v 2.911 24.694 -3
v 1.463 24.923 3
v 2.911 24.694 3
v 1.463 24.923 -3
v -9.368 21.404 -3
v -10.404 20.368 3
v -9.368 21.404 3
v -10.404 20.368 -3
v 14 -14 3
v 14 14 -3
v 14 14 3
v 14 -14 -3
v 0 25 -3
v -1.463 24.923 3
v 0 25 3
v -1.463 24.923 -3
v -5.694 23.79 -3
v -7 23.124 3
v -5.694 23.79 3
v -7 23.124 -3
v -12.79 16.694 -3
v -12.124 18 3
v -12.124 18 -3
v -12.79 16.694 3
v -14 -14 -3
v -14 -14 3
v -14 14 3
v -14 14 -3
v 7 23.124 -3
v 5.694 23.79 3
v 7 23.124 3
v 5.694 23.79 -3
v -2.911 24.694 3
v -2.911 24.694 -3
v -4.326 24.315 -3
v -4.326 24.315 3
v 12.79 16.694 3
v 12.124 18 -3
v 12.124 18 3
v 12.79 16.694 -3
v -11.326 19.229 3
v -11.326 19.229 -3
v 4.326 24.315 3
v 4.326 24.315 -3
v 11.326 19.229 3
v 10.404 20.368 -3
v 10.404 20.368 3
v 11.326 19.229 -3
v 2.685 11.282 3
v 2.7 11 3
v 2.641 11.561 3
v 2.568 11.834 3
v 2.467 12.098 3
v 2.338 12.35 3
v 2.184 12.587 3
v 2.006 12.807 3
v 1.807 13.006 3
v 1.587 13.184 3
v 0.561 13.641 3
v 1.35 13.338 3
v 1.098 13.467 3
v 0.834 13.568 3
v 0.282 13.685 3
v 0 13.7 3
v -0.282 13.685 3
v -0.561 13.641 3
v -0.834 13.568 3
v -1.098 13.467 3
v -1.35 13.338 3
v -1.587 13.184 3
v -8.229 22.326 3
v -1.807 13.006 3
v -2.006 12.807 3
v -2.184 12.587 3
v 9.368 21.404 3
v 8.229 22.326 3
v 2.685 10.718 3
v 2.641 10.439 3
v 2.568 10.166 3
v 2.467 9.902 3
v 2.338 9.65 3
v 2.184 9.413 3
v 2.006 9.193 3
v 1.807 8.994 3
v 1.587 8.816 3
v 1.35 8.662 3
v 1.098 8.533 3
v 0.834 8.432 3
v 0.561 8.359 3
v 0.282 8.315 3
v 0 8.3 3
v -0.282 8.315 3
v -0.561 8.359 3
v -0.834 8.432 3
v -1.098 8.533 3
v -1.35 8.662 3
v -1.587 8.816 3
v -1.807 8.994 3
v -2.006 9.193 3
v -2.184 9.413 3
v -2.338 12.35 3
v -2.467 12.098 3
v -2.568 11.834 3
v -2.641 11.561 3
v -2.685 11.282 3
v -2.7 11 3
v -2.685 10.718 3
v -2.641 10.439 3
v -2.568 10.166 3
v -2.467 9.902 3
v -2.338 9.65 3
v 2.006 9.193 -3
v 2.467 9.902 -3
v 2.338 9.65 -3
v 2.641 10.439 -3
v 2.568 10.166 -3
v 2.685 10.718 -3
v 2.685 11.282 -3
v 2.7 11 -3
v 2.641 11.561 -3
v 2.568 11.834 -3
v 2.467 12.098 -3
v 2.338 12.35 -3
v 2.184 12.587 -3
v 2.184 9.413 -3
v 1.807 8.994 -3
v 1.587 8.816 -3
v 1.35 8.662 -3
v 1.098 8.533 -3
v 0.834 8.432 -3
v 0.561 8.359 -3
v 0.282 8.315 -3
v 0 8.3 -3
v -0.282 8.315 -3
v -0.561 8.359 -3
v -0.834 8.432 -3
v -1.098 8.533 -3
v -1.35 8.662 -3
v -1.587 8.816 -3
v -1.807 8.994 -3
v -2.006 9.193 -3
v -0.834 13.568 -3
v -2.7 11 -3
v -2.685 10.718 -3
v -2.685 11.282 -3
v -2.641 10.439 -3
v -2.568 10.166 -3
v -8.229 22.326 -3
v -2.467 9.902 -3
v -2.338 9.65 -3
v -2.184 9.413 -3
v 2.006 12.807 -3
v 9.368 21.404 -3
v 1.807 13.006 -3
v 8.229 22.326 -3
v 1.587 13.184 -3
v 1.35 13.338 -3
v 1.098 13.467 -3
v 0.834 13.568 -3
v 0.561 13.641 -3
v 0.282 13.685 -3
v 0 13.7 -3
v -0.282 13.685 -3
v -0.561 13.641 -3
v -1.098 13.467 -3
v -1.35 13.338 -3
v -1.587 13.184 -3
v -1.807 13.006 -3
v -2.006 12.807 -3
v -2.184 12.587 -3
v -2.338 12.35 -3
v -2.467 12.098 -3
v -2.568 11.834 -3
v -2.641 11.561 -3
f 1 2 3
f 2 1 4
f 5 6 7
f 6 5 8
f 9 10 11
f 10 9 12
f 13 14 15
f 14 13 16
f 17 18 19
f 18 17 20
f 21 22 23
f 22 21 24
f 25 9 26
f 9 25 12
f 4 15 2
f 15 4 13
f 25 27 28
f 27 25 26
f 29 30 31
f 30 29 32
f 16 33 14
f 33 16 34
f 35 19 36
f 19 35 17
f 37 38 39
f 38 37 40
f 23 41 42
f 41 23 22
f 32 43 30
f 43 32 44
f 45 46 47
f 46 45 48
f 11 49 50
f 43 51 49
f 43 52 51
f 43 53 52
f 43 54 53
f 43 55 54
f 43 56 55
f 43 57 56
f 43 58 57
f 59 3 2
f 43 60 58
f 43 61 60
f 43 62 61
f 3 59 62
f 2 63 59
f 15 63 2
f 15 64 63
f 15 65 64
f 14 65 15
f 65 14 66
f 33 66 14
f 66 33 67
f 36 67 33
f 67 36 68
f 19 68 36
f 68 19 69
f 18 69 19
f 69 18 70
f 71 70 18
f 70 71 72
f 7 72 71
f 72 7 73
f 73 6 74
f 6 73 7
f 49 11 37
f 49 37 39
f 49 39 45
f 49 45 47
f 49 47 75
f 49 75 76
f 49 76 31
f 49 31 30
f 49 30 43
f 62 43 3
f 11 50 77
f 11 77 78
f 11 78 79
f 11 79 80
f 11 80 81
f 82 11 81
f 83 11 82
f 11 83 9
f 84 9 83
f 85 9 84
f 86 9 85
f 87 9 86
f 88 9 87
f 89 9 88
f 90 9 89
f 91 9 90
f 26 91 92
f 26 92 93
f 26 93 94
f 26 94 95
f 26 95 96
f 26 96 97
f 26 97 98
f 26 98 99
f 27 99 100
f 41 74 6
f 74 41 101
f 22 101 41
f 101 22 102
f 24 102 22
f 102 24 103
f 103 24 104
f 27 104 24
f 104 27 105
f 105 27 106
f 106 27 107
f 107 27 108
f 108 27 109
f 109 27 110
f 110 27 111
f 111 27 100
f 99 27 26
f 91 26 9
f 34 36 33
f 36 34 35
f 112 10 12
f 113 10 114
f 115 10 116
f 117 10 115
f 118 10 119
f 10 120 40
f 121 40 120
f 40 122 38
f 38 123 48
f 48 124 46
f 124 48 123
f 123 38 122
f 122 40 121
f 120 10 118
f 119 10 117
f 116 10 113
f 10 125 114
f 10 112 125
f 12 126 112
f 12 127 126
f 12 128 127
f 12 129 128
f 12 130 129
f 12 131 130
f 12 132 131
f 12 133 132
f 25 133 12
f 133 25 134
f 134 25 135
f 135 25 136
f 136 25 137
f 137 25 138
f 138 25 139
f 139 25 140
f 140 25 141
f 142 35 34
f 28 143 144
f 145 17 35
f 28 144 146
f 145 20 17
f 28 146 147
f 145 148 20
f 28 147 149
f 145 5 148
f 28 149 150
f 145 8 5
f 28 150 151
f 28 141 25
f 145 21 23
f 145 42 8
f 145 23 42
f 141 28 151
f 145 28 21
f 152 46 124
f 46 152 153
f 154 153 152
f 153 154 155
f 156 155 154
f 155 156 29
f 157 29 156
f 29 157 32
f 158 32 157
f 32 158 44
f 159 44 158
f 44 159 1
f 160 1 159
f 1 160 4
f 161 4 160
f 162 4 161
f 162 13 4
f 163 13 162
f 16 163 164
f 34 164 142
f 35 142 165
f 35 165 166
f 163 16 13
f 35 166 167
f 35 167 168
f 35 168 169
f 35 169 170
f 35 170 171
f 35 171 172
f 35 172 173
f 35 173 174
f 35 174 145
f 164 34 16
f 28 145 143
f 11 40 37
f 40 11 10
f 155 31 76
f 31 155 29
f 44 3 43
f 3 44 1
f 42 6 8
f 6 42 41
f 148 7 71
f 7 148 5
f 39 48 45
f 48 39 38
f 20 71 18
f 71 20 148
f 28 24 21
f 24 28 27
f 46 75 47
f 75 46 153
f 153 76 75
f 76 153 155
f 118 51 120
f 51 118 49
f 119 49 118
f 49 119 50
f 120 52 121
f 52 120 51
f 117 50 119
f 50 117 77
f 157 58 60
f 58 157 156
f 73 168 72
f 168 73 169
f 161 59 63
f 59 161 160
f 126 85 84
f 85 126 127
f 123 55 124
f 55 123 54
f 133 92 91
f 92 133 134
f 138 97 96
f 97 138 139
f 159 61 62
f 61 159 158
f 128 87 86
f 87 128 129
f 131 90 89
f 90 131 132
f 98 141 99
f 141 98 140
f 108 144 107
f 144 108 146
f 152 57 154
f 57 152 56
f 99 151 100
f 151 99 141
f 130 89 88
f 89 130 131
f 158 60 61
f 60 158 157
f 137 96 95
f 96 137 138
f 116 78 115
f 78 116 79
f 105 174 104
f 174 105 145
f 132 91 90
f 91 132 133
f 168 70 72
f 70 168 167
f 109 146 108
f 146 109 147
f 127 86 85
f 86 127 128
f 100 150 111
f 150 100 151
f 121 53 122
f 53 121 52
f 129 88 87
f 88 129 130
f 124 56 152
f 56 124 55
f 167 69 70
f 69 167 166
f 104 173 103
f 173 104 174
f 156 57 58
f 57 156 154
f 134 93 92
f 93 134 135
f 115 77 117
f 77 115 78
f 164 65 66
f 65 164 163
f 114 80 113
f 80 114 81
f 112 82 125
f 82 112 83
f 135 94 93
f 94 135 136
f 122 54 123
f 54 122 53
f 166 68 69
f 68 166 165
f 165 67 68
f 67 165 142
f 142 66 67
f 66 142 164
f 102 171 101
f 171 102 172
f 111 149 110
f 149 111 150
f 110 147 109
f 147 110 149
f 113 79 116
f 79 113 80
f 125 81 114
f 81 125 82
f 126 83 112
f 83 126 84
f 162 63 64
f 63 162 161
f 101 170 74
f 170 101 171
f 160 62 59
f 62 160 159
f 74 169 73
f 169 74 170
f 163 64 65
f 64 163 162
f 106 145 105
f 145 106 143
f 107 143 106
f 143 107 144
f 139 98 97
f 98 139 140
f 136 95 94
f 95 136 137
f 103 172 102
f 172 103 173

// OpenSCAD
// Single-hole mounting tab.
$fn = 60;
eps = 0.02;
tab_w = 28;
tab_h = 50;
tab_t = 6;
hole_d = 5.4;
difference() {
    hull() {
        translate([0, 0, 0]) cube([tab_w, tab_w, tab_t], center = true);
        translate([0, tab_h / 2 - tab_w / 2, 0]) cylinder(d = tab_w, h = tab_t, center = true);
    }
    translate([0, tab_h / 2 - tab_w / 2, -tab_t / 2 - eps]) cylinder(d = hole_d, h = tab_t + 2 * eps);
}
